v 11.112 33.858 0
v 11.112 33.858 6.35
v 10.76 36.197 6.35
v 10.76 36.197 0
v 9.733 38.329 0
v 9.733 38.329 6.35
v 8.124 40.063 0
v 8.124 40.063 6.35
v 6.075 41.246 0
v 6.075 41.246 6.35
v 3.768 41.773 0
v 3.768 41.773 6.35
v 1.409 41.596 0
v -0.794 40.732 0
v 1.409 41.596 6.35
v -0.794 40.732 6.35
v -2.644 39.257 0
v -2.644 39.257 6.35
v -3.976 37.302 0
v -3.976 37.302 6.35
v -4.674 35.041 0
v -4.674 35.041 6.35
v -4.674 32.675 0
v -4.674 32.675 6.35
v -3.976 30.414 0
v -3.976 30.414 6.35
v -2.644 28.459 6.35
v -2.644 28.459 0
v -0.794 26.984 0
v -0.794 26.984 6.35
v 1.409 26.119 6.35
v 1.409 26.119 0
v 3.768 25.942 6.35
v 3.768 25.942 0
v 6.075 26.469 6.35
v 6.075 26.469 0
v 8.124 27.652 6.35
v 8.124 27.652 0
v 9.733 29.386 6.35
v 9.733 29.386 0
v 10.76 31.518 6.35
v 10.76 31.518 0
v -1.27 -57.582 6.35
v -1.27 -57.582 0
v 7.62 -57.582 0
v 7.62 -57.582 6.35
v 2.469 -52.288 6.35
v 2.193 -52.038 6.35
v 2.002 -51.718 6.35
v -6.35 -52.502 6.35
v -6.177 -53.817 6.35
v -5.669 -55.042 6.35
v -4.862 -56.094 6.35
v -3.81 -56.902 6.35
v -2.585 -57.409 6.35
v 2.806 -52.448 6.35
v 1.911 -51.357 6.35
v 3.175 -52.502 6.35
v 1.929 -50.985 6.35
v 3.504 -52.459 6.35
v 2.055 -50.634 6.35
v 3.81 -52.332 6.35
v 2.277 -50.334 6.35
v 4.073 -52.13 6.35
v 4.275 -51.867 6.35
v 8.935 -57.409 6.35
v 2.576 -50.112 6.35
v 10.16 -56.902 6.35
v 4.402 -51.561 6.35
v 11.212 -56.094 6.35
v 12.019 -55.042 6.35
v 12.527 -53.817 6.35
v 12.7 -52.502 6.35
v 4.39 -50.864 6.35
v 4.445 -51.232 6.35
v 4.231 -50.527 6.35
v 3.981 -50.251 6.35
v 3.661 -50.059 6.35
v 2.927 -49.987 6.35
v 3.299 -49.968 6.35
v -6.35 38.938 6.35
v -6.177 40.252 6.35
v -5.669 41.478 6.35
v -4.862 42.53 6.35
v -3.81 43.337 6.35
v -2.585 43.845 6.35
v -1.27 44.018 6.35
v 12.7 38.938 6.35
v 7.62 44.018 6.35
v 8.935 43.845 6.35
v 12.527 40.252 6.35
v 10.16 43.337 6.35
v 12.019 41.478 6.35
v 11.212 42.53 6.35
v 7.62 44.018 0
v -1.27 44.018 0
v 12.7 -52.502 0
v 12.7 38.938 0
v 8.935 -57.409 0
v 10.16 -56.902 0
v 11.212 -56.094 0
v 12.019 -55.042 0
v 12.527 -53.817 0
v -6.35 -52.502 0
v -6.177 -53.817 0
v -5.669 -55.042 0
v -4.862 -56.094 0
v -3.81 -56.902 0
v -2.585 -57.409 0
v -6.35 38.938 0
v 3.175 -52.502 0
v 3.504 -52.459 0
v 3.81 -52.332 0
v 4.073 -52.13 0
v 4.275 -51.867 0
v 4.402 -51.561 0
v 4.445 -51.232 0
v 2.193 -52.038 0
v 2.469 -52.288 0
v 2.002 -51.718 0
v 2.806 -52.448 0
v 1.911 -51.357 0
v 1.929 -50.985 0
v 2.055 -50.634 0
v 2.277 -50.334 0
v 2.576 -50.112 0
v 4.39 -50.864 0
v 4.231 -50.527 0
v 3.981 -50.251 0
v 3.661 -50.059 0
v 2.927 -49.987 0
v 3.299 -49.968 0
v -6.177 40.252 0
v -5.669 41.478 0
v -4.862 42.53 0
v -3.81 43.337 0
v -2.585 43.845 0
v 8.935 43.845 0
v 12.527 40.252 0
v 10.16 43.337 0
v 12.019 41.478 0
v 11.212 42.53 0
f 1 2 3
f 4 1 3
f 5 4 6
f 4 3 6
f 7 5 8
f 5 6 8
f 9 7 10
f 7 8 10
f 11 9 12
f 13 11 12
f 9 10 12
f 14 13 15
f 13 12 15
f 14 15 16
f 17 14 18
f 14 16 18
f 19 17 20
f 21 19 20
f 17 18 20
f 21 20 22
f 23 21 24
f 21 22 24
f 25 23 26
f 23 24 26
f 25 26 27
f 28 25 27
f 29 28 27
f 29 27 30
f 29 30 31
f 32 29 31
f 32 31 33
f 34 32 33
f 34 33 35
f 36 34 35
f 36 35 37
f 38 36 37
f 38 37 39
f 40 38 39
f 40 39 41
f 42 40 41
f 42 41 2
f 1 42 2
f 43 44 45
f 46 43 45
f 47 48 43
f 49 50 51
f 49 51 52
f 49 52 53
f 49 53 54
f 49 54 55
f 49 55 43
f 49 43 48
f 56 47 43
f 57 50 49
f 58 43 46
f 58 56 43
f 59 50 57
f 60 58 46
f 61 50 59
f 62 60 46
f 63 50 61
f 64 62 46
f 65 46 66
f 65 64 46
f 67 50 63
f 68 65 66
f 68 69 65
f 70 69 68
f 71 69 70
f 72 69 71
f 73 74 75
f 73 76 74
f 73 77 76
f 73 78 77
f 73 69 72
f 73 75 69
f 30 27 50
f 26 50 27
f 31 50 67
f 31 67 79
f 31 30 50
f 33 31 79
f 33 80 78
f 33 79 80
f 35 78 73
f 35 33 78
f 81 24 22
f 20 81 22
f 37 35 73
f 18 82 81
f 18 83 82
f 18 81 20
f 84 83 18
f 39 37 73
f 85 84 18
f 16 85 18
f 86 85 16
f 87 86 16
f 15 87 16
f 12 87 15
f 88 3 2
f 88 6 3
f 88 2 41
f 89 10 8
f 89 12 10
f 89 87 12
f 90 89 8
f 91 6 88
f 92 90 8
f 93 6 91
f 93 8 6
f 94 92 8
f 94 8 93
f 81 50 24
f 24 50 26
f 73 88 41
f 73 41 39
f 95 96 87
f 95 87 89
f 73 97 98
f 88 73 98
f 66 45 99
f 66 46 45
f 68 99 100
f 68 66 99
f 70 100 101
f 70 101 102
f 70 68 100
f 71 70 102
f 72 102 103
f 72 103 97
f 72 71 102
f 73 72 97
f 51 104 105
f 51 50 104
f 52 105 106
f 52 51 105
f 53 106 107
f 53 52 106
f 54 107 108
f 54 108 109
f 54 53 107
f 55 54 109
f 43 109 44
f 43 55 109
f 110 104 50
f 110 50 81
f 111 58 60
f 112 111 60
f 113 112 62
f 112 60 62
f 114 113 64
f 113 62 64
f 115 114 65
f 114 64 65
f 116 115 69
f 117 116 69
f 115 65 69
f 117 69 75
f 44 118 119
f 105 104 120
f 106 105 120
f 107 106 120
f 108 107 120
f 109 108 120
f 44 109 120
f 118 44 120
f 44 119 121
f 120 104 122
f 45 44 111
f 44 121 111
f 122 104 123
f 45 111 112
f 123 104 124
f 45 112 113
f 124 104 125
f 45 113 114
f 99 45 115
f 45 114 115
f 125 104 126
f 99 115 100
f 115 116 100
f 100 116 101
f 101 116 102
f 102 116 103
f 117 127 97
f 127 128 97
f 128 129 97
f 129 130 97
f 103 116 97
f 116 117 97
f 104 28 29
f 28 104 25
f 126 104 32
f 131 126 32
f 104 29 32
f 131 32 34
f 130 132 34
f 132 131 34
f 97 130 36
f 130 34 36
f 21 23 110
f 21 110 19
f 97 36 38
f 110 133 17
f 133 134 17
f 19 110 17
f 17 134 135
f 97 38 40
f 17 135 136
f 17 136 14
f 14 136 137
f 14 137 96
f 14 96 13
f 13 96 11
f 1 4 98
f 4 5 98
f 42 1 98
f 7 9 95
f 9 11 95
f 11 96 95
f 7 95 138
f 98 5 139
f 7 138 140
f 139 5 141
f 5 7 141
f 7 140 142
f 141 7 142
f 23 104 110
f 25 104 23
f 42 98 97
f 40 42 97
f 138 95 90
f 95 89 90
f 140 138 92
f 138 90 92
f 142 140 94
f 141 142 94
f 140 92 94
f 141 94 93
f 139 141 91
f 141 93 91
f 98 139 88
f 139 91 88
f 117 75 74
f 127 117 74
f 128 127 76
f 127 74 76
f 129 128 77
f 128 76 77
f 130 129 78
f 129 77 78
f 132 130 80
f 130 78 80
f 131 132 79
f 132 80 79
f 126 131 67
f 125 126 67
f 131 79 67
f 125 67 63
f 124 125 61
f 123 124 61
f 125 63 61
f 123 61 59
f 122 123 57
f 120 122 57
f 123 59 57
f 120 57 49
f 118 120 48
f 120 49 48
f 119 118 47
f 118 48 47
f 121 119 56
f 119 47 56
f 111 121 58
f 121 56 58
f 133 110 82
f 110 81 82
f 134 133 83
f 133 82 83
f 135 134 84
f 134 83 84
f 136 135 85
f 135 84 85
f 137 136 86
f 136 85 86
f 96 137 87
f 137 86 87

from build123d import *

# Parameters (mm, degrees)
F0_W     = 19.05
F0_H     = 101.6
F1_DEPTH = 6.35
F2_R     = 7.9375
F3_DEPTH = 25.4
F4_R     = 5.08


with BuildPart() as f1:
    # F0 (on Top) → F1 (new body)
    with BuildSketch(Plane.XY):
        with Locations((3.175, -6.782324)):
            Rectangle(F0_W, F0_H)
    extrude(amount=F1_DEPTH)

    # F2 (on face) → F3 (cut)
    with BuildSketch(Plane.XY.offset(6.35)):
        with Locations((3.175, 33.857676)):
            Circle(F2_R)
        with BuildLine():
            ThreePointArc((4.445, -51.232324), (2.276975, -50.334298), (3.175, -52.502324))
            ThreePointArc((3.175, -52.502324), (4.073026, -52.13035), (4.445, -51.232324))
        make_face()
    extrude(amount=-F3_DEPTH, mode=Mode.SUBTRACT)

    # F4
    f4_edges = [f1.edges().sort_by_distance(p)[0] for p in [
        (-6.35, 44.017676, 3.175),
        (-6.35, -57.582324, 3.175),
        (12.7, -57.582324, 3.175),
        (12.7, 44.017676, 3.175),
    ]]
    fillet(f4_edges, radius=F4_R)


solid = f1.part
